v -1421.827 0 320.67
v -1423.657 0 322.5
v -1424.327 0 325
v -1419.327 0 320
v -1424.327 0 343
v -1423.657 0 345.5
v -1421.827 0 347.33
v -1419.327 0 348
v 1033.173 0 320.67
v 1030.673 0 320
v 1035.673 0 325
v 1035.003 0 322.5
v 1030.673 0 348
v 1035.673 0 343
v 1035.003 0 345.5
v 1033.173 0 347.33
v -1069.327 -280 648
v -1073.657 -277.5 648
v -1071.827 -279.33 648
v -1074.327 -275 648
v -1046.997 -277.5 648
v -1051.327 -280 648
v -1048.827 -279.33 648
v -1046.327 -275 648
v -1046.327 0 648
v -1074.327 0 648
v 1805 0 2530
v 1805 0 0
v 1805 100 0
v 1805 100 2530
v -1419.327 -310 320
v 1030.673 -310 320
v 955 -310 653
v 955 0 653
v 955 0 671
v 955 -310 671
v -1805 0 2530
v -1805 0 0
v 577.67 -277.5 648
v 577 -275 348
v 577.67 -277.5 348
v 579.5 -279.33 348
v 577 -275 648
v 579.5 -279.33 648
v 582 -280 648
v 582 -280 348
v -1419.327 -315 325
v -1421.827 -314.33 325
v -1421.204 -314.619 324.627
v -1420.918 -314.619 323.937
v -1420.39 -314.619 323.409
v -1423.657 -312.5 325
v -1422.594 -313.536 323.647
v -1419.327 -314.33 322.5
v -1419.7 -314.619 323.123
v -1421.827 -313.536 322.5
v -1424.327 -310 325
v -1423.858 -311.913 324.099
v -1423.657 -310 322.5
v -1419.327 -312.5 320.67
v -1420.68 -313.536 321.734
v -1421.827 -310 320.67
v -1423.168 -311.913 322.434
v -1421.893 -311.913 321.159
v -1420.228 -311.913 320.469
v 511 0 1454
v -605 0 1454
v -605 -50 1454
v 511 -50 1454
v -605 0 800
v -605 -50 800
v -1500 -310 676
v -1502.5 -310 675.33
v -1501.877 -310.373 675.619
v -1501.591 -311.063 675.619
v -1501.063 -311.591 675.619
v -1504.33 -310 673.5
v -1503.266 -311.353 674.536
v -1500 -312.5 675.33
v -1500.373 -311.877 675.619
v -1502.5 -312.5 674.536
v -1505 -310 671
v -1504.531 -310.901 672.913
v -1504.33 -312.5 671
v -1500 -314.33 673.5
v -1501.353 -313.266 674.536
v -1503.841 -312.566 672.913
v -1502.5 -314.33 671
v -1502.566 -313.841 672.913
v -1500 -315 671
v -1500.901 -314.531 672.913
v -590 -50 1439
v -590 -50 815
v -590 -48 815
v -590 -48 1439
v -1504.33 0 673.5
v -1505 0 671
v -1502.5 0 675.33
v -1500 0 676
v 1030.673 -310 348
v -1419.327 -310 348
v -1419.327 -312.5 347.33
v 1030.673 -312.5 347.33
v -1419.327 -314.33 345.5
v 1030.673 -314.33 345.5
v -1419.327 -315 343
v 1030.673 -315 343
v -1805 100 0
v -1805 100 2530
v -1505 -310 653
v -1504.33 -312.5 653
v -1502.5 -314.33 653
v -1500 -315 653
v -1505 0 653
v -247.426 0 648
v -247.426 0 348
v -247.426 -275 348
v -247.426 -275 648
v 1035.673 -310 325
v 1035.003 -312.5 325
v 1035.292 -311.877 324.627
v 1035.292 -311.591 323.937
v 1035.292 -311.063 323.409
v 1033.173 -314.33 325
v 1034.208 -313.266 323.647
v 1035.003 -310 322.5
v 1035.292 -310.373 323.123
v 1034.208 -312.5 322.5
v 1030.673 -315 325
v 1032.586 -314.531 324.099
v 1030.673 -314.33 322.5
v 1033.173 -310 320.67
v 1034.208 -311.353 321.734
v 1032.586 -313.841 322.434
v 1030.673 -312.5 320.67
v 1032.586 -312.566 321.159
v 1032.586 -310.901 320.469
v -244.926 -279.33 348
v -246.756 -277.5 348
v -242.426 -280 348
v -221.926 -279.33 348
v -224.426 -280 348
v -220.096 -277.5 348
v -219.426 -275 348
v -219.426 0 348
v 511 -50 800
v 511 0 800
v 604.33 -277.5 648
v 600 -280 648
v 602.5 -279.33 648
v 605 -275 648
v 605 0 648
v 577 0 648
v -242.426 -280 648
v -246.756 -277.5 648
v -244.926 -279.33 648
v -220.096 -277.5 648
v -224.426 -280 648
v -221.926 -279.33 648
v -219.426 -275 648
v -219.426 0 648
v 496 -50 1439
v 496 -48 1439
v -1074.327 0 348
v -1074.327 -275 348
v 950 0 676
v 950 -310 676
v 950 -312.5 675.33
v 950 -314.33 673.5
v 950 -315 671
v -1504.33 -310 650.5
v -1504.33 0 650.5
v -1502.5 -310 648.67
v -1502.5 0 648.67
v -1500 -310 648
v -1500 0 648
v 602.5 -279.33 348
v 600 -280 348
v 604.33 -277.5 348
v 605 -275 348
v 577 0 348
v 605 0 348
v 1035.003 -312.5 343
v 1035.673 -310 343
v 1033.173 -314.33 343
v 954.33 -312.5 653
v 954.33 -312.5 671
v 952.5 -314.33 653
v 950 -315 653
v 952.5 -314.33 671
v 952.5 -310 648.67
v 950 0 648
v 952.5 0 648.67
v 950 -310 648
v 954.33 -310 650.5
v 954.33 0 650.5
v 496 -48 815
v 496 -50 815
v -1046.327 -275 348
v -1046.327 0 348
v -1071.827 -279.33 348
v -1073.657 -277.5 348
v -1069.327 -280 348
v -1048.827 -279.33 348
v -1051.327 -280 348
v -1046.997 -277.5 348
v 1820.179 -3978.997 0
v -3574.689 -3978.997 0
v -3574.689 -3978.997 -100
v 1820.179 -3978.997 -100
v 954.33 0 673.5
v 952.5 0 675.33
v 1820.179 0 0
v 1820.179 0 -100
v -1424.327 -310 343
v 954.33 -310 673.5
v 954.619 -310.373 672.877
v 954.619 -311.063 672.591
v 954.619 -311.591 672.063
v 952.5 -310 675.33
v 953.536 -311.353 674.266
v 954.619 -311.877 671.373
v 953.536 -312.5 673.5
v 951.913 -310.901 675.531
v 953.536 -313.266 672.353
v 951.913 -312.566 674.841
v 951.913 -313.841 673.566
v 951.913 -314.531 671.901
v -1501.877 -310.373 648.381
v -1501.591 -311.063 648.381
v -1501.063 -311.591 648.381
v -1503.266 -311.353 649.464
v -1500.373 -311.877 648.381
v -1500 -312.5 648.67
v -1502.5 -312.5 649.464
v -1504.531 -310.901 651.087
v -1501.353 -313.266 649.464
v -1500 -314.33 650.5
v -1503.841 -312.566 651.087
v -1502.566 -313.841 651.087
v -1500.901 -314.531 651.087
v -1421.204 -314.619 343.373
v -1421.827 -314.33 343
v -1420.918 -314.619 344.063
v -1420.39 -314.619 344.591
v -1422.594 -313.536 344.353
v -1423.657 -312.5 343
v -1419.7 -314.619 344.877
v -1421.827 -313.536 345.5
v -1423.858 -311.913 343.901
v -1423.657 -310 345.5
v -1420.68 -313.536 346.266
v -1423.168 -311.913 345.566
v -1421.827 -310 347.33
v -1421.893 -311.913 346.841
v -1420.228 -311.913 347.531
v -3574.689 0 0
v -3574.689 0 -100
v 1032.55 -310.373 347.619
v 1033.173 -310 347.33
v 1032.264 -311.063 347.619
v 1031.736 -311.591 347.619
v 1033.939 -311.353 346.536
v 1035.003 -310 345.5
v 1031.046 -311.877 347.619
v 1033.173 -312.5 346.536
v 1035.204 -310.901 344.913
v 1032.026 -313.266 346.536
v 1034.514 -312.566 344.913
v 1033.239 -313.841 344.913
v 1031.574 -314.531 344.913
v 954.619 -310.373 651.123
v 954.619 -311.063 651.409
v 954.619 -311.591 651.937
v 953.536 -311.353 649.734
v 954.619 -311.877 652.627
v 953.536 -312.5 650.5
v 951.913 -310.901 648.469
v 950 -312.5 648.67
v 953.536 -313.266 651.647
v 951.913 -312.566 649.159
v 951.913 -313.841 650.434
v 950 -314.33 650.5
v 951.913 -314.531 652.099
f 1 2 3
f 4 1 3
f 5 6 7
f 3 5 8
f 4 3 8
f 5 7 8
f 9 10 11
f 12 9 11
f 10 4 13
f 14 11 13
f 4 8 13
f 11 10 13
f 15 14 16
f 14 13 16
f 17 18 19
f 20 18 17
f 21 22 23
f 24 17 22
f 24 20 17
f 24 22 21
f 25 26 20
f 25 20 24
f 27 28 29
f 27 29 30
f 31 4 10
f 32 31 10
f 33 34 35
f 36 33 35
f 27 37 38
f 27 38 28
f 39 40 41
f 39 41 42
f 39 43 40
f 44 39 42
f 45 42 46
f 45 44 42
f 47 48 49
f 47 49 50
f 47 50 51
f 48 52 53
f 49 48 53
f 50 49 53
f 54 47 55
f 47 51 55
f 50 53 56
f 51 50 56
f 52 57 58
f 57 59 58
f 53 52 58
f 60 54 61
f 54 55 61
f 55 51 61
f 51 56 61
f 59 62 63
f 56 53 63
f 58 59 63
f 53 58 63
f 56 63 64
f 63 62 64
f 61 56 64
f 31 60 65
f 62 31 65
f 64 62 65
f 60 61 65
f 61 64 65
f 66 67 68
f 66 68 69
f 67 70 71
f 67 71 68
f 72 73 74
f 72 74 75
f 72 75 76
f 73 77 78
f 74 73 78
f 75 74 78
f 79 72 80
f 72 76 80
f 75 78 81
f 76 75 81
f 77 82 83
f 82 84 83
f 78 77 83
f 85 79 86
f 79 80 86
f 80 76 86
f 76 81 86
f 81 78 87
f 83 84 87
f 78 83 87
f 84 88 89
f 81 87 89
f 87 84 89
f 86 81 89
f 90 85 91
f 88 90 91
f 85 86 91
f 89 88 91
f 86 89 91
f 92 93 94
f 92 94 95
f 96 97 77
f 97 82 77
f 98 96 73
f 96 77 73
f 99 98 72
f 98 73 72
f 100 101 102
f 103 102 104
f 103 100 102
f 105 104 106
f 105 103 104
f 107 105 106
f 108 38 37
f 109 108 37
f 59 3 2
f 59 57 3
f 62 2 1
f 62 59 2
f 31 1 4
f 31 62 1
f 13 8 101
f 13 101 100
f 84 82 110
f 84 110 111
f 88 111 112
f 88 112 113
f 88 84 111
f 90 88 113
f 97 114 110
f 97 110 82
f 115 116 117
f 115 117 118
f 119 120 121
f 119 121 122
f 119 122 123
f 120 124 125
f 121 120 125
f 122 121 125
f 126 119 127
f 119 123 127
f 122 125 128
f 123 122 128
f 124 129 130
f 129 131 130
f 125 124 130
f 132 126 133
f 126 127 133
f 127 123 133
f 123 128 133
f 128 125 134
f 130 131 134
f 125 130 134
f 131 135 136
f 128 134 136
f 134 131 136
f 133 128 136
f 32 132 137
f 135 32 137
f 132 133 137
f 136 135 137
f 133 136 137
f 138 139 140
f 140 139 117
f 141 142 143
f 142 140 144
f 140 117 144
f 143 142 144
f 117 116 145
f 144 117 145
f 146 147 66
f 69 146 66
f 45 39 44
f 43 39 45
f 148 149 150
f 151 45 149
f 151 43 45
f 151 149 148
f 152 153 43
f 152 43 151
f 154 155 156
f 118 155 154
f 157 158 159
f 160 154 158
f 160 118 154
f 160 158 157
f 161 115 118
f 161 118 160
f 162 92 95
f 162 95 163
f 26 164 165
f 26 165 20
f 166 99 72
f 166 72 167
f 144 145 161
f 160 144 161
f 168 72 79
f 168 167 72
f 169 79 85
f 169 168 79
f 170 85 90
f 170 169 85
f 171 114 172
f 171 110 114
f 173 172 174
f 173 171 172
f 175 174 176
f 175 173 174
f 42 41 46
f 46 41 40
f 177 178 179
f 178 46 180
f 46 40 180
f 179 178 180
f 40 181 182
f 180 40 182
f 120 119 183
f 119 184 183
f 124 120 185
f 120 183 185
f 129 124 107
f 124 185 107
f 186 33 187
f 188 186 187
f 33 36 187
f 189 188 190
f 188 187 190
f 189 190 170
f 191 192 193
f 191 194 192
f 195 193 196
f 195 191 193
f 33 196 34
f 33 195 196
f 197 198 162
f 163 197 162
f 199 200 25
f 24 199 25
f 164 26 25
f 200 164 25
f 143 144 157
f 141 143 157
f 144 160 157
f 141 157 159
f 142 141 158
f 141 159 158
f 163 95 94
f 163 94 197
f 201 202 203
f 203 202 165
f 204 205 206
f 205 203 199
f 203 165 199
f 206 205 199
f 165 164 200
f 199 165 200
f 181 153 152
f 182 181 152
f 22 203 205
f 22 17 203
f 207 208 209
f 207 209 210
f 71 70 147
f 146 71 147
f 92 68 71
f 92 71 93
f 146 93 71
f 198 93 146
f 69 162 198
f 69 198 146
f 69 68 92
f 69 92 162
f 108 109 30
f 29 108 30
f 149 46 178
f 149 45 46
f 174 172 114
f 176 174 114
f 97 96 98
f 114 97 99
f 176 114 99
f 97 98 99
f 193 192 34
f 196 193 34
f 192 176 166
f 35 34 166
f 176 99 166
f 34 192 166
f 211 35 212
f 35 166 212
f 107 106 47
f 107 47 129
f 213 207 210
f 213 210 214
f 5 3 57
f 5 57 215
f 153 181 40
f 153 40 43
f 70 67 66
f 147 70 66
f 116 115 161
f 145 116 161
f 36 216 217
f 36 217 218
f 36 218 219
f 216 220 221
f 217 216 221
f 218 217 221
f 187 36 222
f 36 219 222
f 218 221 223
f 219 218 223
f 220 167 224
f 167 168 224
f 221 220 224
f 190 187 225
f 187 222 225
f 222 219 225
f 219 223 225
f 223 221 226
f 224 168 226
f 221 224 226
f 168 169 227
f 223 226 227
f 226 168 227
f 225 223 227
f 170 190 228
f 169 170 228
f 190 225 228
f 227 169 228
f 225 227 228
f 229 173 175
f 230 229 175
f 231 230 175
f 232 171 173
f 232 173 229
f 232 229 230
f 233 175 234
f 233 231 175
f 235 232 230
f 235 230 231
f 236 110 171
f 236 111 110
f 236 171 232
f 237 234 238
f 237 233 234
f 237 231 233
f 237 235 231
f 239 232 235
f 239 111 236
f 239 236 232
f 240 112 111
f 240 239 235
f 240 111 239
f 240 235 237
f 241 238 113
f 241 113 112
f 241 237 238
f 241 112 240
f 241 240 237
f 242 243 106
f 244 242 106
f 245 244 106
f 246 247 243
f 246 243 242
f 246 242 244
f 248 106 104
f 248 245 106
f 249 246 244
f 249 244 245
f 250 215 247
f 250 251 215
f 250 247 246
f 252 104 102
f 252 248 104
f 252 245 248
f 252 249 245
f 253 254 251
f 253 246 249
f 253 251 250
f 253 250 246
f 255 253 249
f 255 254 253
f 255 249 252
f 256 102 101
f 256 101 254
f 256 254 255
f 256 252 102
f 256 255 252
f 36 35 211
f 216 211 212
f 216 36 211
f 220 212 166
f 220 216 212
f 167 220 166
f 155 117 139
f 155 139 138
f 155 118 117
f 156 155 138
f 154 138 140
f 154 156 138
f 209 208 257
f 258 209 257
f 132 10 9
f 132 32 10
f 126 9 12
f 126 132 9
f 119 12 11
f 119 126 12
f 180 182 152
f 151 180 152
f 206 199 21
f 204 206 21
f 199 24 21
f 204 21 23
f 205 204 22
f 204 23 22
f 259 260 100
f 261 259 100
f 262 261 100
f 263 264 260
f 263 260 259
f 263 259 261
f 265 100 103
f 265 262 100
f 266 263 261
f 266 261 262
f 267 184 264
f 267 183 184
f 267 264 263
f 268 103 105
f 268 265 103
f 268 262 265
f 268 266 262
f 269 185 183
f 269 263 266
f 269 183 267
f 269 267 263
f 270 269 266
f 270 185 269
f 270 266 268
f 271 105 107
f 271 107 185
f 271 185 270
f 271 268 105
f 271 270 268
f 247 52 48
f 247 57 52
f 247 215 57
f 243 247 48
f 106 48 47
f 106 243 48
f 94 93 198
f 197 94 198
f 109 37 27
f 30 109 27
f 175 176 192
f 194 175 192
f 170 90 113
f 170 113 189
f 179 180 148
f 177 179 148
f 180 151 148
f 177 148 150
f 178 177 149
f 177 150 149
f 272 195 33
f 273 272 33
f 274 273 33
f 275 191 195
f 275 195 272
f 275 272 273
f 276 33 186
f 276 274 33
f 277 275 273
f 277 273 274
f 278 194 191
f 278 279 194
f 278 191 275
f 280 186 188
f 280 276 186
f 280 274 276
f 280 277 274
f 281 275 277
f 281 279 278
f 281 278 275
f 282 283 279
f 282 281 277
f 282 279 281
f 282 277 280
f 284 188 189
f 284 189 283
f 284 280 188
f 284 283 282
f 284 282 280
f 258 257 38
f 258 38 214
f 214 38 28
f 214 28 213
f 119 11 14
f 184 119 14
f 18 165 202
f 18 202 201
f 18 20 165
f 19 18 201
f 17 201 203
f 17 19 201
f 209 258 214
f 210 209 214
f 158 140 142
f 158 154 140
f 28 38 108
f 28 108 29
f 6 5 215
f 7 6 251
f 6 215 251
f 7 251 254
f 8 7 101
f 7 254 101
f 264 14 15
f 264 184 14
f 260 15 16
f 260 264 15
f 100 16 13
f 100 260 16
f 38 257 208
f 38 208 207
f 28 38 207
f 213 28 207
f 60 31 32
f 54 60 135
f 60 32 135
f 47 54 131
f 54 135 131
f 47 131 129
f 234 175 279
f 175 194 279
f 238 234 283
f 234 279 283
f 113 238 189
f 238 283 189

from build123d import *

# Parameters (mm, degrees)
F0_W      = 3610
F0_H      = 2530
F1_DEPTH  = 100
F2_W      = 5394.867659
F2_H      = 3978.996754
F3_DEPTH  = 100
F4_W      = 1116
F4_H      = 654
F5_DEPTH  = 50
F6_W      = 1086
F6_H      = 624
F7_DEPTH  = 2
F8_W      = 2460
F8_H      = 28
F9_DEPTH  = 315
F10_W     = 28
F10_H     = 300
F11_DEPTH = 280
F12_R     = 5
F13_R     = 5


with BuildPart() as f1:
    # F0 (on Front) → F1 (new body)
    with BuildSketch(Plane.XZ):
        with Locations((0, 1265)):
            Rectangle(F0_W, F0_H)
    extrude(amount=-F1_DEPTH)

    # F2 (on Top) → F3 (join)
    with BuildSketch(Plane.XY):
        with Locations((-877.25532, -1989.498377)):
            Rectangle(F2_W, F2_H)
    extrude(amount=-F3_DEPTH)


with BuildPart() as f5:
    # F4 (on face) → F5 (new body)
    with BuildSketch(Plane.XZ):
        with Locations((-47, 1127)):
            Rectangle(F4_W, F4_H)
    extrude(amount=F5_DEPTH)

    # F6 (on face) → F7 (cut)
    with BuildSketch(Plane.XZ.offset(50)):
        with Locations((-47, 1127)):
            Rectangle(F6_W, F6_H)
    extrude(amount=-F7_DEPTH, mode=Mode.SUBTRACT)


with BuildPart() as f9:
    # F8 (on face) → F9 (new body)
    with BuildSketch(Plane.XZ):
        with Locations((-275, 662)):
            Rectangle(F8_W, F8_H)
        with Locations((-194.327097, 334)):
            Rectangle(F8_W, F8_H)
    extrude(amount=F9_DEPTH)

    # F12
    f12_edges = [f9.edges().sort_by_distance(p)[0] for p in [
        (-1505, -315, 662),
        (-1505, -157.5, 676),
        (-1505, -157.5, 648),
        (-275, -315, 648),
        (-275, -315, 676),
        (-1424.327097, -157.5, 348),
        (-1424.327097, -157.5, 320),
        (-1424.327097, -315, 334),
        (-194.327097, -315, 320),
        (955, -157.5, 676),
        (1035.672903, -315, 334),
        (1035.672903, -157.5, 320),
        (1035.672903, -157.5, 348),
        (955, -157.5, 648),
        (955, -315, 662),
        (-194.327097, -315, 348),
    ]]
    fillet(f12_edges, radius=F12_R)


with BuildPart() as f11:
    # F10 (on face) → F11 (new body)
    with BuildSketch(Plane.XZ):
        with Locations((-1060.327097, 498)):
            Rectangle(F10_W, F10_H)
        with Locations((591, 498)):
            Rectangle(F10_W, F10_H)
        with Locations((-233.42569, 498)):
            Rectangle(F10_W, F10_H)
    extrude(amount=F11_DEPTH)

    # F13
    f13_edges = [f11.edges().sort_by_distance(p)[0] for p in [
        (-1074.327097, -280, 498),
        (-247.42569, -280, 498),
        (577, -280, 498),
        (-1046.327097, -280, 498),
        (-219.42569, -280, 498),
        (605, -280, 498),
    ]]
    fillet(f13_edges, radius=F13_R)


solid = Compound([f1.part, f5.part, f9.part, f11.part])
